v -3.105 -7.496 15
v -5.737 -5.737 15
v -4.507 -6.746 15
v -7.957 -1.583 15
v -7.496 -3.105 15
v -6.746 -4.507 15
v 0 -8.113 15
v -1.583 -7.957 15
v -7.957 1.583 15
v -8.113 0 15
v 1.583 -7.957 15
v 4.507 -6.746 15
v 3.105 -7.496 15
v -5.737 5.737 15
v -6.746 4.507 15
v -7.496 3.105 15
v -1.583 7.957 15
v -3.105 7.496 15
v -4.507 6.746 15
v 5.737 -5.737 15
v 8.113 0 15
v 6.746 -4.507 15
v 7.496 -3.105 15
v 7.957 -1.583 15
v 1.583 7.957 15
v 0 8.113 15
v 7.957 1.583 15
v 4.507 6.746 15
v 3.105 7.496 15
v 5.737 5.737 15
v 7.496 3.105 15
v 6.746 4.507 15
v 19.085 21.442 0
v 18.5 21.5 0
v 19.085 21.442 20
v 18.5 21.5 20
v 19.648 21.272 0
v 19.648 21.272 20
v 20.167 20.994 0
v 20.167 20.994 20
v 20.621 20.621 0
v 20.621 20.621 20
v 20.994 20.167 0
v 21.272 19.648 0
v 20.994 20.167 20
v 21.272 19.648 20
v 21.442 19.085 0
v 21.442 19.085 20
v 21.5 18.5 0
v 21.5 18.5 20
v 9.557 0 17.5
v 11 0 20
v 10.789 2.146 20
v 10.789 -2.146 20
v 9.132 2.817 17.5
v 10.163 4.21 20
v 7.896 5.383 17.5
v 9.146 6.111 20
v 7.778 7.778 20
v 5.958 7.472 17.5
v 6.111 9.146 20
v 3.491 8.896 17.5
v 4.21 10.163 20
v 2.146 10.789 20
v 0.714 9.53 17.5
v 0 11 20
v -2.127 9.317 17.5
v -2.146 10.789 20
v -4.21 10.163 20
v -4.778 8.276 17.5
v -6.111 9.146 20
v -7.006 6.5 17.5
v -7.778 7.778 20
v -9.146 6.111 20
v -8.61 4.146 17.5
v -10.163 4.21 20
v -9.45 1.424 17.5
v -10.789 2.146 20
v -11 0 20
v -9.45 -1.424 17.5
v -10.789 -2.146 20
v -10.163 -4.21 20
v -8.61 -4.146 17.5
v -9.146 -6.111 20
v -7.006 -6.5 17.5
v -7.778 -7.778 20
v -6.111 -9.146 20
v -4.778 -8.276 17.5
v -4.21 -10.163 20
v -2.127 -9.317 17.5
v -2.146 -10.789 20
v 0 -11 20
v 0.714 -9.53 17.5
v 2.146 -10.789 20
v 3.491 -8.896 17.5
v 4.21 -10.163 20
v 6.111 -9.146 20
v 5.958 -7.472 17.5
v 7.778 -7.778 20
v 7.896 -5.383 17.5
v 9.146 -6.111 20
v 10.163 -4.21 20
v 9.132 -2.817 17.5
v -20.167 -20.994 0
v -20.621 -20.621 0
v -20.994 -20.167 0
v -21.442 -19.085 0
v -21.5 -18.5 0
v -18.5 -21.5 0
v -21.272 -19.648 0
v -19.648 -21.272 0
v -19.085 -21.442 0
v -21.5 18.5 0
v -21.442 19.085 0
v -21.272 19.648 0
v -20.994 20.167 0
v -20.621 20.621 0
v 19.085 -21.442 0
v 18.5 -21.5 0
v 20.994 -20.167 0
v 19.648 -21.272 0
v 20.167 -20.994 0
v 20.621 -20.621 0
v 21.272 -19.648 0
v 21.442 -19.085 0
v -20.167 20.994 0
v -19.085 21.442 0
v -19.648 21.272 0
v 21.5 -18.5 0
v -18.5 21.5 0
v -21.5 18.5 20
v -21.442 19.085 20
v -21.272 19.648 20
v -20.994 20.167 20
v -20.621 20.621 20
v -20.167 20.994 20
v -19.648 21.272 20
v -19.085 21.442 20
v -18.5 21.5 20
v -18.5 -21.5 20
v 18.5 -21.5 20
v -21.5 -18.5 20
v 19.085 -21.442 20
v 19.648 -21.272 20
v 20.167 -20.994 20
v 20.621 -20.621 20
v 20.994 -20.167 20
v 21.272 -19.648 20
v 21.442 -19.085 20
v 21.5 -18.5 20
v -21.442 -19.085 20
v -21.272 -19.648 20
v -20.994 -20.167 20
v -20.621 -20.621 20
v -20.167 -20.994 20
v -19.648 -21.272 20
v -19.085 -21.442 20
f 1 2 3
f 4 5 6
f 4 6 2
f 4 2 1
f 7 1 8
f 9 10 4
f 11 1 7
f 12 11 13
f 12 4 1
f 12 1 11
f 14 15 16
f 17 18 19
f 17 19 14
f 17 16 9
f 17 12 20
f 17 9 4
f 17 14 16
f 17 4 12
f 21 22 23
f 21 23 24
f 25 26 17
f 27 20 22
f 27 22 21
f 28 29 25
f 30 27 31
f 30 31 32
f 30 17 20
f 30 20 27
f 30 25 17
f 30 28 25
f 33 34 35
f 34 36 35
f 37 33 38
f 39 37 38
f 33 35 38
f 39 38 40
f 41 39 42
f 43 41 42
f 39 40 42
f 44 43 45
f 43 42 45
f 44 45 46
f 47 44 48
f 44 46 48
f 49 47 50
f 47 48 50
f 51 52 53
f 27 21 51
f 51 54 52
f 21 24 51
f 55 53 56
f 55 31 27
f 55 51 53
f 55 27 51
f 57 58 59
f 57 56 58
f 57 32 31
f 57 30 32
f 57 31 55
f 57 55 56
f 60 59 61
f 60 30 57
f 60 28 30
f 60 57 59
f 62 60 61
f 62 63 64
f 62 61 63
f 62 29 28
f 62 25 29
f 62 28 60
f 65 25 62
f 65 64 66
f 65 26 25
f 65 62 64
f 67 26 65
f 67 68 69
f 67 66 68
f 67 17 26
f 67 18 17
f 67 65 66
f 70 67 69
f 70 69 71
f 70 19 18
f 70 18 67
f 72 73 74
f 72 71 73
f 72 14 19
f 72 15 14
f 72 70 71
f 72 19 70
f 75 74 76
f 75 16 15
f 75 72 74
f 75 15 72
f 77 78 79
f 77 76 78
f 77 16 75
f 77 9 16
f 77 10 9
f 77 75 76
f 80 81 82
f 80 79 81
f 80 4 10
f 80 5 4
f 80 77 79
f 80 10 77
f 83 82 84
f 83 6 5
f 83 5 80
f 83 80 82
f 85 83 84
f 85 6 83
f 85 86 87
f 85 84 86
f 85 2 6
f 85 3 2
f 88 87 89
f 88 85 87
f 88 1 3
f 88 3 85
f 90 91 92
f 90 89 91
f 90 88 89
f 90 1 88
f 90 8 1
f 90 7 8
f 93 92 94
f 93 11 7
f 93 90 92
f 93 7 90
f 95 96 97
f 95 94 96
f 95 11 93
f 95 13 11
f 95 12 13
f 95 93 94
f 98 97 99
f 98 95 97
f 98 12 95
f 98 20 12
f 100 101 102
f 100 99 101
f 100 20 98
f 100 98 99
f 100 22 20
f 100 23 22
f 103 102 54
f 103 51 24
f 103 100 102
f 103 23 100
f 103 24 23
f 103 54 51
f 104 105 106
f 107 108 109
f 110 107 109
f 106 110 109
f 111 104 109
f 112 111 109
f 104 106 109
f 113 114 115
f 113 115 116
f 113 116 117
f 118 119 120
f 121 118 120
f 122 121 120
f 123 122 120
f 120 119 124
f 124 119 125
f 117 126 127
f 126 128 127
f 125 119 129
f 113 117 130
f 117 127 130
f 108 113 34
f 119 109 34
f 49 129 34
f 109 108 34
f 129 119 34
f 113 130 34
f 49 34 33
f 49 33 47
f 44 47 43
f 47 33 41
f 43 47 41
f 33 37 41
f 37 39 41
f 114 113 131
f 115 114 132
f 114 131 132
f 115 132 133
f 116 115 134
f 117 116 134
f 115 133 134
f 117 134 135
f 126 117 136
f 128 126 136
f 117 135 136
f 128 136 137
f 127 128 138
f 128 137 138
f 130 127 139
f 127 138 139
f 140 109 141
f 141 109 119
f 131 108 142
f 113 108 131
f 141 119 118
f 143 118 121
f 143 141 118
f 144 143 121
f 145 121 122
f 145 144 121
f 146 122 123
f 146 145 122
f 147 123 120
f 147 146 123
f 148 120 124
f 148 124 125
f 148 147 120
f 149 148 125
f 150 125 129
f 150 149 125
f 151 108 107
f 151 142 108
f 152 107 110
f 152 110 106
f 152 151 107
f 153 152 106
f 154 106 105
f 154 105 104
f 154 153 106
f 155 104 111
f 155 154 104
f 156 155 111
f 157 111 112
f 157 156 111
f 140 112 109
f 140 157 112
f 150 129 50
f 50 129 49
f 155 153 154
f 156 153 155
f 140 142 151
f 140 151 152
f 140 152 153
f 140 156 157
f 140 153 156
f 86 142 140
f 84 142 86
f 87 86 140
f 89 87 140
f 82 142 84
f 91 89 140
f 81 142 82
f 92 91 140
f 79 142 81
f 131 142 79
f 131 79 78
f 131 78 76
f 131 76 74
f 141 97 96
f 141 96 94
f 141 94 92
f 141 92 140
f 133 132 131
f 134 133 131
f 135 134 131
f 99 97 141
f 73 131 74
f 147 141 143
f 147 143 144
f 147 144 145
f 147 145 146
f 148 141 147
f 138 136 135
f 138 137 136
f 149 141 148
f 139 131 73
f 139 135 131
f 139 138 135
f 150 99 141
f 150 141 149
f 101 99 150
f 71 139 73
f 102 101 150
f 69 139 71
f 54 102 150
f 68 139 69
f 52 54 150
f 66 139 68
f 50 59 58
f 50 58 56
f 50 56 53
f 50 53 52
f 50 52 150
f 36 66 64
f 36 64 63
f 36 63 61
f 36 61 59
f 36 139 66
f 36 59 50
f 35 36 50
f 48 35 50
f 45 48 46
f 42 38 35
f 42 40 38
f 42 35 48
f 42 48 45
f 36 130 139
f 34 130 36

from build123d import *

# Parameters (mm, degrees)
SKETCH_W     = 43
SKETCH_H     = 43
PAD_DEPTH    = 20
SKETCH001_R  = 11
POCKET_DEPTH = 5
POCKET_TAPER = 30
FILLET_R     = 3


with BuildPart() as part:
    # Sketch → Pad (new body)
    with BuildSketch(Plane.XY):
        Rectangle(SKETCH_W, SKETCH_H)
    extrude(amount=PAD_DEPTH)

    # Sketch001 (on Face6 of Pad) → Pocket (cut)
    with BuildSketch(Plane.XY.offset(20)):
        Circle(SKETCH001_R)
    extrude(amount=-POCKET_DEPTH, taper=POCKET_TAPER, mode=Mode.SUBTRACT)

    # Fillet
    fillet_edges = [part.edges().sort_by_distance(p)[0] for p in [
        (21.5, -21.5, 10),
        (21.5, 21.5, 10),
        (-21.5, -21.5, 10),
        (-21.5, 21.5, 10),
    ]]
    fillet(fillet_edges, radius=FILLET_R)


solid = part.part
